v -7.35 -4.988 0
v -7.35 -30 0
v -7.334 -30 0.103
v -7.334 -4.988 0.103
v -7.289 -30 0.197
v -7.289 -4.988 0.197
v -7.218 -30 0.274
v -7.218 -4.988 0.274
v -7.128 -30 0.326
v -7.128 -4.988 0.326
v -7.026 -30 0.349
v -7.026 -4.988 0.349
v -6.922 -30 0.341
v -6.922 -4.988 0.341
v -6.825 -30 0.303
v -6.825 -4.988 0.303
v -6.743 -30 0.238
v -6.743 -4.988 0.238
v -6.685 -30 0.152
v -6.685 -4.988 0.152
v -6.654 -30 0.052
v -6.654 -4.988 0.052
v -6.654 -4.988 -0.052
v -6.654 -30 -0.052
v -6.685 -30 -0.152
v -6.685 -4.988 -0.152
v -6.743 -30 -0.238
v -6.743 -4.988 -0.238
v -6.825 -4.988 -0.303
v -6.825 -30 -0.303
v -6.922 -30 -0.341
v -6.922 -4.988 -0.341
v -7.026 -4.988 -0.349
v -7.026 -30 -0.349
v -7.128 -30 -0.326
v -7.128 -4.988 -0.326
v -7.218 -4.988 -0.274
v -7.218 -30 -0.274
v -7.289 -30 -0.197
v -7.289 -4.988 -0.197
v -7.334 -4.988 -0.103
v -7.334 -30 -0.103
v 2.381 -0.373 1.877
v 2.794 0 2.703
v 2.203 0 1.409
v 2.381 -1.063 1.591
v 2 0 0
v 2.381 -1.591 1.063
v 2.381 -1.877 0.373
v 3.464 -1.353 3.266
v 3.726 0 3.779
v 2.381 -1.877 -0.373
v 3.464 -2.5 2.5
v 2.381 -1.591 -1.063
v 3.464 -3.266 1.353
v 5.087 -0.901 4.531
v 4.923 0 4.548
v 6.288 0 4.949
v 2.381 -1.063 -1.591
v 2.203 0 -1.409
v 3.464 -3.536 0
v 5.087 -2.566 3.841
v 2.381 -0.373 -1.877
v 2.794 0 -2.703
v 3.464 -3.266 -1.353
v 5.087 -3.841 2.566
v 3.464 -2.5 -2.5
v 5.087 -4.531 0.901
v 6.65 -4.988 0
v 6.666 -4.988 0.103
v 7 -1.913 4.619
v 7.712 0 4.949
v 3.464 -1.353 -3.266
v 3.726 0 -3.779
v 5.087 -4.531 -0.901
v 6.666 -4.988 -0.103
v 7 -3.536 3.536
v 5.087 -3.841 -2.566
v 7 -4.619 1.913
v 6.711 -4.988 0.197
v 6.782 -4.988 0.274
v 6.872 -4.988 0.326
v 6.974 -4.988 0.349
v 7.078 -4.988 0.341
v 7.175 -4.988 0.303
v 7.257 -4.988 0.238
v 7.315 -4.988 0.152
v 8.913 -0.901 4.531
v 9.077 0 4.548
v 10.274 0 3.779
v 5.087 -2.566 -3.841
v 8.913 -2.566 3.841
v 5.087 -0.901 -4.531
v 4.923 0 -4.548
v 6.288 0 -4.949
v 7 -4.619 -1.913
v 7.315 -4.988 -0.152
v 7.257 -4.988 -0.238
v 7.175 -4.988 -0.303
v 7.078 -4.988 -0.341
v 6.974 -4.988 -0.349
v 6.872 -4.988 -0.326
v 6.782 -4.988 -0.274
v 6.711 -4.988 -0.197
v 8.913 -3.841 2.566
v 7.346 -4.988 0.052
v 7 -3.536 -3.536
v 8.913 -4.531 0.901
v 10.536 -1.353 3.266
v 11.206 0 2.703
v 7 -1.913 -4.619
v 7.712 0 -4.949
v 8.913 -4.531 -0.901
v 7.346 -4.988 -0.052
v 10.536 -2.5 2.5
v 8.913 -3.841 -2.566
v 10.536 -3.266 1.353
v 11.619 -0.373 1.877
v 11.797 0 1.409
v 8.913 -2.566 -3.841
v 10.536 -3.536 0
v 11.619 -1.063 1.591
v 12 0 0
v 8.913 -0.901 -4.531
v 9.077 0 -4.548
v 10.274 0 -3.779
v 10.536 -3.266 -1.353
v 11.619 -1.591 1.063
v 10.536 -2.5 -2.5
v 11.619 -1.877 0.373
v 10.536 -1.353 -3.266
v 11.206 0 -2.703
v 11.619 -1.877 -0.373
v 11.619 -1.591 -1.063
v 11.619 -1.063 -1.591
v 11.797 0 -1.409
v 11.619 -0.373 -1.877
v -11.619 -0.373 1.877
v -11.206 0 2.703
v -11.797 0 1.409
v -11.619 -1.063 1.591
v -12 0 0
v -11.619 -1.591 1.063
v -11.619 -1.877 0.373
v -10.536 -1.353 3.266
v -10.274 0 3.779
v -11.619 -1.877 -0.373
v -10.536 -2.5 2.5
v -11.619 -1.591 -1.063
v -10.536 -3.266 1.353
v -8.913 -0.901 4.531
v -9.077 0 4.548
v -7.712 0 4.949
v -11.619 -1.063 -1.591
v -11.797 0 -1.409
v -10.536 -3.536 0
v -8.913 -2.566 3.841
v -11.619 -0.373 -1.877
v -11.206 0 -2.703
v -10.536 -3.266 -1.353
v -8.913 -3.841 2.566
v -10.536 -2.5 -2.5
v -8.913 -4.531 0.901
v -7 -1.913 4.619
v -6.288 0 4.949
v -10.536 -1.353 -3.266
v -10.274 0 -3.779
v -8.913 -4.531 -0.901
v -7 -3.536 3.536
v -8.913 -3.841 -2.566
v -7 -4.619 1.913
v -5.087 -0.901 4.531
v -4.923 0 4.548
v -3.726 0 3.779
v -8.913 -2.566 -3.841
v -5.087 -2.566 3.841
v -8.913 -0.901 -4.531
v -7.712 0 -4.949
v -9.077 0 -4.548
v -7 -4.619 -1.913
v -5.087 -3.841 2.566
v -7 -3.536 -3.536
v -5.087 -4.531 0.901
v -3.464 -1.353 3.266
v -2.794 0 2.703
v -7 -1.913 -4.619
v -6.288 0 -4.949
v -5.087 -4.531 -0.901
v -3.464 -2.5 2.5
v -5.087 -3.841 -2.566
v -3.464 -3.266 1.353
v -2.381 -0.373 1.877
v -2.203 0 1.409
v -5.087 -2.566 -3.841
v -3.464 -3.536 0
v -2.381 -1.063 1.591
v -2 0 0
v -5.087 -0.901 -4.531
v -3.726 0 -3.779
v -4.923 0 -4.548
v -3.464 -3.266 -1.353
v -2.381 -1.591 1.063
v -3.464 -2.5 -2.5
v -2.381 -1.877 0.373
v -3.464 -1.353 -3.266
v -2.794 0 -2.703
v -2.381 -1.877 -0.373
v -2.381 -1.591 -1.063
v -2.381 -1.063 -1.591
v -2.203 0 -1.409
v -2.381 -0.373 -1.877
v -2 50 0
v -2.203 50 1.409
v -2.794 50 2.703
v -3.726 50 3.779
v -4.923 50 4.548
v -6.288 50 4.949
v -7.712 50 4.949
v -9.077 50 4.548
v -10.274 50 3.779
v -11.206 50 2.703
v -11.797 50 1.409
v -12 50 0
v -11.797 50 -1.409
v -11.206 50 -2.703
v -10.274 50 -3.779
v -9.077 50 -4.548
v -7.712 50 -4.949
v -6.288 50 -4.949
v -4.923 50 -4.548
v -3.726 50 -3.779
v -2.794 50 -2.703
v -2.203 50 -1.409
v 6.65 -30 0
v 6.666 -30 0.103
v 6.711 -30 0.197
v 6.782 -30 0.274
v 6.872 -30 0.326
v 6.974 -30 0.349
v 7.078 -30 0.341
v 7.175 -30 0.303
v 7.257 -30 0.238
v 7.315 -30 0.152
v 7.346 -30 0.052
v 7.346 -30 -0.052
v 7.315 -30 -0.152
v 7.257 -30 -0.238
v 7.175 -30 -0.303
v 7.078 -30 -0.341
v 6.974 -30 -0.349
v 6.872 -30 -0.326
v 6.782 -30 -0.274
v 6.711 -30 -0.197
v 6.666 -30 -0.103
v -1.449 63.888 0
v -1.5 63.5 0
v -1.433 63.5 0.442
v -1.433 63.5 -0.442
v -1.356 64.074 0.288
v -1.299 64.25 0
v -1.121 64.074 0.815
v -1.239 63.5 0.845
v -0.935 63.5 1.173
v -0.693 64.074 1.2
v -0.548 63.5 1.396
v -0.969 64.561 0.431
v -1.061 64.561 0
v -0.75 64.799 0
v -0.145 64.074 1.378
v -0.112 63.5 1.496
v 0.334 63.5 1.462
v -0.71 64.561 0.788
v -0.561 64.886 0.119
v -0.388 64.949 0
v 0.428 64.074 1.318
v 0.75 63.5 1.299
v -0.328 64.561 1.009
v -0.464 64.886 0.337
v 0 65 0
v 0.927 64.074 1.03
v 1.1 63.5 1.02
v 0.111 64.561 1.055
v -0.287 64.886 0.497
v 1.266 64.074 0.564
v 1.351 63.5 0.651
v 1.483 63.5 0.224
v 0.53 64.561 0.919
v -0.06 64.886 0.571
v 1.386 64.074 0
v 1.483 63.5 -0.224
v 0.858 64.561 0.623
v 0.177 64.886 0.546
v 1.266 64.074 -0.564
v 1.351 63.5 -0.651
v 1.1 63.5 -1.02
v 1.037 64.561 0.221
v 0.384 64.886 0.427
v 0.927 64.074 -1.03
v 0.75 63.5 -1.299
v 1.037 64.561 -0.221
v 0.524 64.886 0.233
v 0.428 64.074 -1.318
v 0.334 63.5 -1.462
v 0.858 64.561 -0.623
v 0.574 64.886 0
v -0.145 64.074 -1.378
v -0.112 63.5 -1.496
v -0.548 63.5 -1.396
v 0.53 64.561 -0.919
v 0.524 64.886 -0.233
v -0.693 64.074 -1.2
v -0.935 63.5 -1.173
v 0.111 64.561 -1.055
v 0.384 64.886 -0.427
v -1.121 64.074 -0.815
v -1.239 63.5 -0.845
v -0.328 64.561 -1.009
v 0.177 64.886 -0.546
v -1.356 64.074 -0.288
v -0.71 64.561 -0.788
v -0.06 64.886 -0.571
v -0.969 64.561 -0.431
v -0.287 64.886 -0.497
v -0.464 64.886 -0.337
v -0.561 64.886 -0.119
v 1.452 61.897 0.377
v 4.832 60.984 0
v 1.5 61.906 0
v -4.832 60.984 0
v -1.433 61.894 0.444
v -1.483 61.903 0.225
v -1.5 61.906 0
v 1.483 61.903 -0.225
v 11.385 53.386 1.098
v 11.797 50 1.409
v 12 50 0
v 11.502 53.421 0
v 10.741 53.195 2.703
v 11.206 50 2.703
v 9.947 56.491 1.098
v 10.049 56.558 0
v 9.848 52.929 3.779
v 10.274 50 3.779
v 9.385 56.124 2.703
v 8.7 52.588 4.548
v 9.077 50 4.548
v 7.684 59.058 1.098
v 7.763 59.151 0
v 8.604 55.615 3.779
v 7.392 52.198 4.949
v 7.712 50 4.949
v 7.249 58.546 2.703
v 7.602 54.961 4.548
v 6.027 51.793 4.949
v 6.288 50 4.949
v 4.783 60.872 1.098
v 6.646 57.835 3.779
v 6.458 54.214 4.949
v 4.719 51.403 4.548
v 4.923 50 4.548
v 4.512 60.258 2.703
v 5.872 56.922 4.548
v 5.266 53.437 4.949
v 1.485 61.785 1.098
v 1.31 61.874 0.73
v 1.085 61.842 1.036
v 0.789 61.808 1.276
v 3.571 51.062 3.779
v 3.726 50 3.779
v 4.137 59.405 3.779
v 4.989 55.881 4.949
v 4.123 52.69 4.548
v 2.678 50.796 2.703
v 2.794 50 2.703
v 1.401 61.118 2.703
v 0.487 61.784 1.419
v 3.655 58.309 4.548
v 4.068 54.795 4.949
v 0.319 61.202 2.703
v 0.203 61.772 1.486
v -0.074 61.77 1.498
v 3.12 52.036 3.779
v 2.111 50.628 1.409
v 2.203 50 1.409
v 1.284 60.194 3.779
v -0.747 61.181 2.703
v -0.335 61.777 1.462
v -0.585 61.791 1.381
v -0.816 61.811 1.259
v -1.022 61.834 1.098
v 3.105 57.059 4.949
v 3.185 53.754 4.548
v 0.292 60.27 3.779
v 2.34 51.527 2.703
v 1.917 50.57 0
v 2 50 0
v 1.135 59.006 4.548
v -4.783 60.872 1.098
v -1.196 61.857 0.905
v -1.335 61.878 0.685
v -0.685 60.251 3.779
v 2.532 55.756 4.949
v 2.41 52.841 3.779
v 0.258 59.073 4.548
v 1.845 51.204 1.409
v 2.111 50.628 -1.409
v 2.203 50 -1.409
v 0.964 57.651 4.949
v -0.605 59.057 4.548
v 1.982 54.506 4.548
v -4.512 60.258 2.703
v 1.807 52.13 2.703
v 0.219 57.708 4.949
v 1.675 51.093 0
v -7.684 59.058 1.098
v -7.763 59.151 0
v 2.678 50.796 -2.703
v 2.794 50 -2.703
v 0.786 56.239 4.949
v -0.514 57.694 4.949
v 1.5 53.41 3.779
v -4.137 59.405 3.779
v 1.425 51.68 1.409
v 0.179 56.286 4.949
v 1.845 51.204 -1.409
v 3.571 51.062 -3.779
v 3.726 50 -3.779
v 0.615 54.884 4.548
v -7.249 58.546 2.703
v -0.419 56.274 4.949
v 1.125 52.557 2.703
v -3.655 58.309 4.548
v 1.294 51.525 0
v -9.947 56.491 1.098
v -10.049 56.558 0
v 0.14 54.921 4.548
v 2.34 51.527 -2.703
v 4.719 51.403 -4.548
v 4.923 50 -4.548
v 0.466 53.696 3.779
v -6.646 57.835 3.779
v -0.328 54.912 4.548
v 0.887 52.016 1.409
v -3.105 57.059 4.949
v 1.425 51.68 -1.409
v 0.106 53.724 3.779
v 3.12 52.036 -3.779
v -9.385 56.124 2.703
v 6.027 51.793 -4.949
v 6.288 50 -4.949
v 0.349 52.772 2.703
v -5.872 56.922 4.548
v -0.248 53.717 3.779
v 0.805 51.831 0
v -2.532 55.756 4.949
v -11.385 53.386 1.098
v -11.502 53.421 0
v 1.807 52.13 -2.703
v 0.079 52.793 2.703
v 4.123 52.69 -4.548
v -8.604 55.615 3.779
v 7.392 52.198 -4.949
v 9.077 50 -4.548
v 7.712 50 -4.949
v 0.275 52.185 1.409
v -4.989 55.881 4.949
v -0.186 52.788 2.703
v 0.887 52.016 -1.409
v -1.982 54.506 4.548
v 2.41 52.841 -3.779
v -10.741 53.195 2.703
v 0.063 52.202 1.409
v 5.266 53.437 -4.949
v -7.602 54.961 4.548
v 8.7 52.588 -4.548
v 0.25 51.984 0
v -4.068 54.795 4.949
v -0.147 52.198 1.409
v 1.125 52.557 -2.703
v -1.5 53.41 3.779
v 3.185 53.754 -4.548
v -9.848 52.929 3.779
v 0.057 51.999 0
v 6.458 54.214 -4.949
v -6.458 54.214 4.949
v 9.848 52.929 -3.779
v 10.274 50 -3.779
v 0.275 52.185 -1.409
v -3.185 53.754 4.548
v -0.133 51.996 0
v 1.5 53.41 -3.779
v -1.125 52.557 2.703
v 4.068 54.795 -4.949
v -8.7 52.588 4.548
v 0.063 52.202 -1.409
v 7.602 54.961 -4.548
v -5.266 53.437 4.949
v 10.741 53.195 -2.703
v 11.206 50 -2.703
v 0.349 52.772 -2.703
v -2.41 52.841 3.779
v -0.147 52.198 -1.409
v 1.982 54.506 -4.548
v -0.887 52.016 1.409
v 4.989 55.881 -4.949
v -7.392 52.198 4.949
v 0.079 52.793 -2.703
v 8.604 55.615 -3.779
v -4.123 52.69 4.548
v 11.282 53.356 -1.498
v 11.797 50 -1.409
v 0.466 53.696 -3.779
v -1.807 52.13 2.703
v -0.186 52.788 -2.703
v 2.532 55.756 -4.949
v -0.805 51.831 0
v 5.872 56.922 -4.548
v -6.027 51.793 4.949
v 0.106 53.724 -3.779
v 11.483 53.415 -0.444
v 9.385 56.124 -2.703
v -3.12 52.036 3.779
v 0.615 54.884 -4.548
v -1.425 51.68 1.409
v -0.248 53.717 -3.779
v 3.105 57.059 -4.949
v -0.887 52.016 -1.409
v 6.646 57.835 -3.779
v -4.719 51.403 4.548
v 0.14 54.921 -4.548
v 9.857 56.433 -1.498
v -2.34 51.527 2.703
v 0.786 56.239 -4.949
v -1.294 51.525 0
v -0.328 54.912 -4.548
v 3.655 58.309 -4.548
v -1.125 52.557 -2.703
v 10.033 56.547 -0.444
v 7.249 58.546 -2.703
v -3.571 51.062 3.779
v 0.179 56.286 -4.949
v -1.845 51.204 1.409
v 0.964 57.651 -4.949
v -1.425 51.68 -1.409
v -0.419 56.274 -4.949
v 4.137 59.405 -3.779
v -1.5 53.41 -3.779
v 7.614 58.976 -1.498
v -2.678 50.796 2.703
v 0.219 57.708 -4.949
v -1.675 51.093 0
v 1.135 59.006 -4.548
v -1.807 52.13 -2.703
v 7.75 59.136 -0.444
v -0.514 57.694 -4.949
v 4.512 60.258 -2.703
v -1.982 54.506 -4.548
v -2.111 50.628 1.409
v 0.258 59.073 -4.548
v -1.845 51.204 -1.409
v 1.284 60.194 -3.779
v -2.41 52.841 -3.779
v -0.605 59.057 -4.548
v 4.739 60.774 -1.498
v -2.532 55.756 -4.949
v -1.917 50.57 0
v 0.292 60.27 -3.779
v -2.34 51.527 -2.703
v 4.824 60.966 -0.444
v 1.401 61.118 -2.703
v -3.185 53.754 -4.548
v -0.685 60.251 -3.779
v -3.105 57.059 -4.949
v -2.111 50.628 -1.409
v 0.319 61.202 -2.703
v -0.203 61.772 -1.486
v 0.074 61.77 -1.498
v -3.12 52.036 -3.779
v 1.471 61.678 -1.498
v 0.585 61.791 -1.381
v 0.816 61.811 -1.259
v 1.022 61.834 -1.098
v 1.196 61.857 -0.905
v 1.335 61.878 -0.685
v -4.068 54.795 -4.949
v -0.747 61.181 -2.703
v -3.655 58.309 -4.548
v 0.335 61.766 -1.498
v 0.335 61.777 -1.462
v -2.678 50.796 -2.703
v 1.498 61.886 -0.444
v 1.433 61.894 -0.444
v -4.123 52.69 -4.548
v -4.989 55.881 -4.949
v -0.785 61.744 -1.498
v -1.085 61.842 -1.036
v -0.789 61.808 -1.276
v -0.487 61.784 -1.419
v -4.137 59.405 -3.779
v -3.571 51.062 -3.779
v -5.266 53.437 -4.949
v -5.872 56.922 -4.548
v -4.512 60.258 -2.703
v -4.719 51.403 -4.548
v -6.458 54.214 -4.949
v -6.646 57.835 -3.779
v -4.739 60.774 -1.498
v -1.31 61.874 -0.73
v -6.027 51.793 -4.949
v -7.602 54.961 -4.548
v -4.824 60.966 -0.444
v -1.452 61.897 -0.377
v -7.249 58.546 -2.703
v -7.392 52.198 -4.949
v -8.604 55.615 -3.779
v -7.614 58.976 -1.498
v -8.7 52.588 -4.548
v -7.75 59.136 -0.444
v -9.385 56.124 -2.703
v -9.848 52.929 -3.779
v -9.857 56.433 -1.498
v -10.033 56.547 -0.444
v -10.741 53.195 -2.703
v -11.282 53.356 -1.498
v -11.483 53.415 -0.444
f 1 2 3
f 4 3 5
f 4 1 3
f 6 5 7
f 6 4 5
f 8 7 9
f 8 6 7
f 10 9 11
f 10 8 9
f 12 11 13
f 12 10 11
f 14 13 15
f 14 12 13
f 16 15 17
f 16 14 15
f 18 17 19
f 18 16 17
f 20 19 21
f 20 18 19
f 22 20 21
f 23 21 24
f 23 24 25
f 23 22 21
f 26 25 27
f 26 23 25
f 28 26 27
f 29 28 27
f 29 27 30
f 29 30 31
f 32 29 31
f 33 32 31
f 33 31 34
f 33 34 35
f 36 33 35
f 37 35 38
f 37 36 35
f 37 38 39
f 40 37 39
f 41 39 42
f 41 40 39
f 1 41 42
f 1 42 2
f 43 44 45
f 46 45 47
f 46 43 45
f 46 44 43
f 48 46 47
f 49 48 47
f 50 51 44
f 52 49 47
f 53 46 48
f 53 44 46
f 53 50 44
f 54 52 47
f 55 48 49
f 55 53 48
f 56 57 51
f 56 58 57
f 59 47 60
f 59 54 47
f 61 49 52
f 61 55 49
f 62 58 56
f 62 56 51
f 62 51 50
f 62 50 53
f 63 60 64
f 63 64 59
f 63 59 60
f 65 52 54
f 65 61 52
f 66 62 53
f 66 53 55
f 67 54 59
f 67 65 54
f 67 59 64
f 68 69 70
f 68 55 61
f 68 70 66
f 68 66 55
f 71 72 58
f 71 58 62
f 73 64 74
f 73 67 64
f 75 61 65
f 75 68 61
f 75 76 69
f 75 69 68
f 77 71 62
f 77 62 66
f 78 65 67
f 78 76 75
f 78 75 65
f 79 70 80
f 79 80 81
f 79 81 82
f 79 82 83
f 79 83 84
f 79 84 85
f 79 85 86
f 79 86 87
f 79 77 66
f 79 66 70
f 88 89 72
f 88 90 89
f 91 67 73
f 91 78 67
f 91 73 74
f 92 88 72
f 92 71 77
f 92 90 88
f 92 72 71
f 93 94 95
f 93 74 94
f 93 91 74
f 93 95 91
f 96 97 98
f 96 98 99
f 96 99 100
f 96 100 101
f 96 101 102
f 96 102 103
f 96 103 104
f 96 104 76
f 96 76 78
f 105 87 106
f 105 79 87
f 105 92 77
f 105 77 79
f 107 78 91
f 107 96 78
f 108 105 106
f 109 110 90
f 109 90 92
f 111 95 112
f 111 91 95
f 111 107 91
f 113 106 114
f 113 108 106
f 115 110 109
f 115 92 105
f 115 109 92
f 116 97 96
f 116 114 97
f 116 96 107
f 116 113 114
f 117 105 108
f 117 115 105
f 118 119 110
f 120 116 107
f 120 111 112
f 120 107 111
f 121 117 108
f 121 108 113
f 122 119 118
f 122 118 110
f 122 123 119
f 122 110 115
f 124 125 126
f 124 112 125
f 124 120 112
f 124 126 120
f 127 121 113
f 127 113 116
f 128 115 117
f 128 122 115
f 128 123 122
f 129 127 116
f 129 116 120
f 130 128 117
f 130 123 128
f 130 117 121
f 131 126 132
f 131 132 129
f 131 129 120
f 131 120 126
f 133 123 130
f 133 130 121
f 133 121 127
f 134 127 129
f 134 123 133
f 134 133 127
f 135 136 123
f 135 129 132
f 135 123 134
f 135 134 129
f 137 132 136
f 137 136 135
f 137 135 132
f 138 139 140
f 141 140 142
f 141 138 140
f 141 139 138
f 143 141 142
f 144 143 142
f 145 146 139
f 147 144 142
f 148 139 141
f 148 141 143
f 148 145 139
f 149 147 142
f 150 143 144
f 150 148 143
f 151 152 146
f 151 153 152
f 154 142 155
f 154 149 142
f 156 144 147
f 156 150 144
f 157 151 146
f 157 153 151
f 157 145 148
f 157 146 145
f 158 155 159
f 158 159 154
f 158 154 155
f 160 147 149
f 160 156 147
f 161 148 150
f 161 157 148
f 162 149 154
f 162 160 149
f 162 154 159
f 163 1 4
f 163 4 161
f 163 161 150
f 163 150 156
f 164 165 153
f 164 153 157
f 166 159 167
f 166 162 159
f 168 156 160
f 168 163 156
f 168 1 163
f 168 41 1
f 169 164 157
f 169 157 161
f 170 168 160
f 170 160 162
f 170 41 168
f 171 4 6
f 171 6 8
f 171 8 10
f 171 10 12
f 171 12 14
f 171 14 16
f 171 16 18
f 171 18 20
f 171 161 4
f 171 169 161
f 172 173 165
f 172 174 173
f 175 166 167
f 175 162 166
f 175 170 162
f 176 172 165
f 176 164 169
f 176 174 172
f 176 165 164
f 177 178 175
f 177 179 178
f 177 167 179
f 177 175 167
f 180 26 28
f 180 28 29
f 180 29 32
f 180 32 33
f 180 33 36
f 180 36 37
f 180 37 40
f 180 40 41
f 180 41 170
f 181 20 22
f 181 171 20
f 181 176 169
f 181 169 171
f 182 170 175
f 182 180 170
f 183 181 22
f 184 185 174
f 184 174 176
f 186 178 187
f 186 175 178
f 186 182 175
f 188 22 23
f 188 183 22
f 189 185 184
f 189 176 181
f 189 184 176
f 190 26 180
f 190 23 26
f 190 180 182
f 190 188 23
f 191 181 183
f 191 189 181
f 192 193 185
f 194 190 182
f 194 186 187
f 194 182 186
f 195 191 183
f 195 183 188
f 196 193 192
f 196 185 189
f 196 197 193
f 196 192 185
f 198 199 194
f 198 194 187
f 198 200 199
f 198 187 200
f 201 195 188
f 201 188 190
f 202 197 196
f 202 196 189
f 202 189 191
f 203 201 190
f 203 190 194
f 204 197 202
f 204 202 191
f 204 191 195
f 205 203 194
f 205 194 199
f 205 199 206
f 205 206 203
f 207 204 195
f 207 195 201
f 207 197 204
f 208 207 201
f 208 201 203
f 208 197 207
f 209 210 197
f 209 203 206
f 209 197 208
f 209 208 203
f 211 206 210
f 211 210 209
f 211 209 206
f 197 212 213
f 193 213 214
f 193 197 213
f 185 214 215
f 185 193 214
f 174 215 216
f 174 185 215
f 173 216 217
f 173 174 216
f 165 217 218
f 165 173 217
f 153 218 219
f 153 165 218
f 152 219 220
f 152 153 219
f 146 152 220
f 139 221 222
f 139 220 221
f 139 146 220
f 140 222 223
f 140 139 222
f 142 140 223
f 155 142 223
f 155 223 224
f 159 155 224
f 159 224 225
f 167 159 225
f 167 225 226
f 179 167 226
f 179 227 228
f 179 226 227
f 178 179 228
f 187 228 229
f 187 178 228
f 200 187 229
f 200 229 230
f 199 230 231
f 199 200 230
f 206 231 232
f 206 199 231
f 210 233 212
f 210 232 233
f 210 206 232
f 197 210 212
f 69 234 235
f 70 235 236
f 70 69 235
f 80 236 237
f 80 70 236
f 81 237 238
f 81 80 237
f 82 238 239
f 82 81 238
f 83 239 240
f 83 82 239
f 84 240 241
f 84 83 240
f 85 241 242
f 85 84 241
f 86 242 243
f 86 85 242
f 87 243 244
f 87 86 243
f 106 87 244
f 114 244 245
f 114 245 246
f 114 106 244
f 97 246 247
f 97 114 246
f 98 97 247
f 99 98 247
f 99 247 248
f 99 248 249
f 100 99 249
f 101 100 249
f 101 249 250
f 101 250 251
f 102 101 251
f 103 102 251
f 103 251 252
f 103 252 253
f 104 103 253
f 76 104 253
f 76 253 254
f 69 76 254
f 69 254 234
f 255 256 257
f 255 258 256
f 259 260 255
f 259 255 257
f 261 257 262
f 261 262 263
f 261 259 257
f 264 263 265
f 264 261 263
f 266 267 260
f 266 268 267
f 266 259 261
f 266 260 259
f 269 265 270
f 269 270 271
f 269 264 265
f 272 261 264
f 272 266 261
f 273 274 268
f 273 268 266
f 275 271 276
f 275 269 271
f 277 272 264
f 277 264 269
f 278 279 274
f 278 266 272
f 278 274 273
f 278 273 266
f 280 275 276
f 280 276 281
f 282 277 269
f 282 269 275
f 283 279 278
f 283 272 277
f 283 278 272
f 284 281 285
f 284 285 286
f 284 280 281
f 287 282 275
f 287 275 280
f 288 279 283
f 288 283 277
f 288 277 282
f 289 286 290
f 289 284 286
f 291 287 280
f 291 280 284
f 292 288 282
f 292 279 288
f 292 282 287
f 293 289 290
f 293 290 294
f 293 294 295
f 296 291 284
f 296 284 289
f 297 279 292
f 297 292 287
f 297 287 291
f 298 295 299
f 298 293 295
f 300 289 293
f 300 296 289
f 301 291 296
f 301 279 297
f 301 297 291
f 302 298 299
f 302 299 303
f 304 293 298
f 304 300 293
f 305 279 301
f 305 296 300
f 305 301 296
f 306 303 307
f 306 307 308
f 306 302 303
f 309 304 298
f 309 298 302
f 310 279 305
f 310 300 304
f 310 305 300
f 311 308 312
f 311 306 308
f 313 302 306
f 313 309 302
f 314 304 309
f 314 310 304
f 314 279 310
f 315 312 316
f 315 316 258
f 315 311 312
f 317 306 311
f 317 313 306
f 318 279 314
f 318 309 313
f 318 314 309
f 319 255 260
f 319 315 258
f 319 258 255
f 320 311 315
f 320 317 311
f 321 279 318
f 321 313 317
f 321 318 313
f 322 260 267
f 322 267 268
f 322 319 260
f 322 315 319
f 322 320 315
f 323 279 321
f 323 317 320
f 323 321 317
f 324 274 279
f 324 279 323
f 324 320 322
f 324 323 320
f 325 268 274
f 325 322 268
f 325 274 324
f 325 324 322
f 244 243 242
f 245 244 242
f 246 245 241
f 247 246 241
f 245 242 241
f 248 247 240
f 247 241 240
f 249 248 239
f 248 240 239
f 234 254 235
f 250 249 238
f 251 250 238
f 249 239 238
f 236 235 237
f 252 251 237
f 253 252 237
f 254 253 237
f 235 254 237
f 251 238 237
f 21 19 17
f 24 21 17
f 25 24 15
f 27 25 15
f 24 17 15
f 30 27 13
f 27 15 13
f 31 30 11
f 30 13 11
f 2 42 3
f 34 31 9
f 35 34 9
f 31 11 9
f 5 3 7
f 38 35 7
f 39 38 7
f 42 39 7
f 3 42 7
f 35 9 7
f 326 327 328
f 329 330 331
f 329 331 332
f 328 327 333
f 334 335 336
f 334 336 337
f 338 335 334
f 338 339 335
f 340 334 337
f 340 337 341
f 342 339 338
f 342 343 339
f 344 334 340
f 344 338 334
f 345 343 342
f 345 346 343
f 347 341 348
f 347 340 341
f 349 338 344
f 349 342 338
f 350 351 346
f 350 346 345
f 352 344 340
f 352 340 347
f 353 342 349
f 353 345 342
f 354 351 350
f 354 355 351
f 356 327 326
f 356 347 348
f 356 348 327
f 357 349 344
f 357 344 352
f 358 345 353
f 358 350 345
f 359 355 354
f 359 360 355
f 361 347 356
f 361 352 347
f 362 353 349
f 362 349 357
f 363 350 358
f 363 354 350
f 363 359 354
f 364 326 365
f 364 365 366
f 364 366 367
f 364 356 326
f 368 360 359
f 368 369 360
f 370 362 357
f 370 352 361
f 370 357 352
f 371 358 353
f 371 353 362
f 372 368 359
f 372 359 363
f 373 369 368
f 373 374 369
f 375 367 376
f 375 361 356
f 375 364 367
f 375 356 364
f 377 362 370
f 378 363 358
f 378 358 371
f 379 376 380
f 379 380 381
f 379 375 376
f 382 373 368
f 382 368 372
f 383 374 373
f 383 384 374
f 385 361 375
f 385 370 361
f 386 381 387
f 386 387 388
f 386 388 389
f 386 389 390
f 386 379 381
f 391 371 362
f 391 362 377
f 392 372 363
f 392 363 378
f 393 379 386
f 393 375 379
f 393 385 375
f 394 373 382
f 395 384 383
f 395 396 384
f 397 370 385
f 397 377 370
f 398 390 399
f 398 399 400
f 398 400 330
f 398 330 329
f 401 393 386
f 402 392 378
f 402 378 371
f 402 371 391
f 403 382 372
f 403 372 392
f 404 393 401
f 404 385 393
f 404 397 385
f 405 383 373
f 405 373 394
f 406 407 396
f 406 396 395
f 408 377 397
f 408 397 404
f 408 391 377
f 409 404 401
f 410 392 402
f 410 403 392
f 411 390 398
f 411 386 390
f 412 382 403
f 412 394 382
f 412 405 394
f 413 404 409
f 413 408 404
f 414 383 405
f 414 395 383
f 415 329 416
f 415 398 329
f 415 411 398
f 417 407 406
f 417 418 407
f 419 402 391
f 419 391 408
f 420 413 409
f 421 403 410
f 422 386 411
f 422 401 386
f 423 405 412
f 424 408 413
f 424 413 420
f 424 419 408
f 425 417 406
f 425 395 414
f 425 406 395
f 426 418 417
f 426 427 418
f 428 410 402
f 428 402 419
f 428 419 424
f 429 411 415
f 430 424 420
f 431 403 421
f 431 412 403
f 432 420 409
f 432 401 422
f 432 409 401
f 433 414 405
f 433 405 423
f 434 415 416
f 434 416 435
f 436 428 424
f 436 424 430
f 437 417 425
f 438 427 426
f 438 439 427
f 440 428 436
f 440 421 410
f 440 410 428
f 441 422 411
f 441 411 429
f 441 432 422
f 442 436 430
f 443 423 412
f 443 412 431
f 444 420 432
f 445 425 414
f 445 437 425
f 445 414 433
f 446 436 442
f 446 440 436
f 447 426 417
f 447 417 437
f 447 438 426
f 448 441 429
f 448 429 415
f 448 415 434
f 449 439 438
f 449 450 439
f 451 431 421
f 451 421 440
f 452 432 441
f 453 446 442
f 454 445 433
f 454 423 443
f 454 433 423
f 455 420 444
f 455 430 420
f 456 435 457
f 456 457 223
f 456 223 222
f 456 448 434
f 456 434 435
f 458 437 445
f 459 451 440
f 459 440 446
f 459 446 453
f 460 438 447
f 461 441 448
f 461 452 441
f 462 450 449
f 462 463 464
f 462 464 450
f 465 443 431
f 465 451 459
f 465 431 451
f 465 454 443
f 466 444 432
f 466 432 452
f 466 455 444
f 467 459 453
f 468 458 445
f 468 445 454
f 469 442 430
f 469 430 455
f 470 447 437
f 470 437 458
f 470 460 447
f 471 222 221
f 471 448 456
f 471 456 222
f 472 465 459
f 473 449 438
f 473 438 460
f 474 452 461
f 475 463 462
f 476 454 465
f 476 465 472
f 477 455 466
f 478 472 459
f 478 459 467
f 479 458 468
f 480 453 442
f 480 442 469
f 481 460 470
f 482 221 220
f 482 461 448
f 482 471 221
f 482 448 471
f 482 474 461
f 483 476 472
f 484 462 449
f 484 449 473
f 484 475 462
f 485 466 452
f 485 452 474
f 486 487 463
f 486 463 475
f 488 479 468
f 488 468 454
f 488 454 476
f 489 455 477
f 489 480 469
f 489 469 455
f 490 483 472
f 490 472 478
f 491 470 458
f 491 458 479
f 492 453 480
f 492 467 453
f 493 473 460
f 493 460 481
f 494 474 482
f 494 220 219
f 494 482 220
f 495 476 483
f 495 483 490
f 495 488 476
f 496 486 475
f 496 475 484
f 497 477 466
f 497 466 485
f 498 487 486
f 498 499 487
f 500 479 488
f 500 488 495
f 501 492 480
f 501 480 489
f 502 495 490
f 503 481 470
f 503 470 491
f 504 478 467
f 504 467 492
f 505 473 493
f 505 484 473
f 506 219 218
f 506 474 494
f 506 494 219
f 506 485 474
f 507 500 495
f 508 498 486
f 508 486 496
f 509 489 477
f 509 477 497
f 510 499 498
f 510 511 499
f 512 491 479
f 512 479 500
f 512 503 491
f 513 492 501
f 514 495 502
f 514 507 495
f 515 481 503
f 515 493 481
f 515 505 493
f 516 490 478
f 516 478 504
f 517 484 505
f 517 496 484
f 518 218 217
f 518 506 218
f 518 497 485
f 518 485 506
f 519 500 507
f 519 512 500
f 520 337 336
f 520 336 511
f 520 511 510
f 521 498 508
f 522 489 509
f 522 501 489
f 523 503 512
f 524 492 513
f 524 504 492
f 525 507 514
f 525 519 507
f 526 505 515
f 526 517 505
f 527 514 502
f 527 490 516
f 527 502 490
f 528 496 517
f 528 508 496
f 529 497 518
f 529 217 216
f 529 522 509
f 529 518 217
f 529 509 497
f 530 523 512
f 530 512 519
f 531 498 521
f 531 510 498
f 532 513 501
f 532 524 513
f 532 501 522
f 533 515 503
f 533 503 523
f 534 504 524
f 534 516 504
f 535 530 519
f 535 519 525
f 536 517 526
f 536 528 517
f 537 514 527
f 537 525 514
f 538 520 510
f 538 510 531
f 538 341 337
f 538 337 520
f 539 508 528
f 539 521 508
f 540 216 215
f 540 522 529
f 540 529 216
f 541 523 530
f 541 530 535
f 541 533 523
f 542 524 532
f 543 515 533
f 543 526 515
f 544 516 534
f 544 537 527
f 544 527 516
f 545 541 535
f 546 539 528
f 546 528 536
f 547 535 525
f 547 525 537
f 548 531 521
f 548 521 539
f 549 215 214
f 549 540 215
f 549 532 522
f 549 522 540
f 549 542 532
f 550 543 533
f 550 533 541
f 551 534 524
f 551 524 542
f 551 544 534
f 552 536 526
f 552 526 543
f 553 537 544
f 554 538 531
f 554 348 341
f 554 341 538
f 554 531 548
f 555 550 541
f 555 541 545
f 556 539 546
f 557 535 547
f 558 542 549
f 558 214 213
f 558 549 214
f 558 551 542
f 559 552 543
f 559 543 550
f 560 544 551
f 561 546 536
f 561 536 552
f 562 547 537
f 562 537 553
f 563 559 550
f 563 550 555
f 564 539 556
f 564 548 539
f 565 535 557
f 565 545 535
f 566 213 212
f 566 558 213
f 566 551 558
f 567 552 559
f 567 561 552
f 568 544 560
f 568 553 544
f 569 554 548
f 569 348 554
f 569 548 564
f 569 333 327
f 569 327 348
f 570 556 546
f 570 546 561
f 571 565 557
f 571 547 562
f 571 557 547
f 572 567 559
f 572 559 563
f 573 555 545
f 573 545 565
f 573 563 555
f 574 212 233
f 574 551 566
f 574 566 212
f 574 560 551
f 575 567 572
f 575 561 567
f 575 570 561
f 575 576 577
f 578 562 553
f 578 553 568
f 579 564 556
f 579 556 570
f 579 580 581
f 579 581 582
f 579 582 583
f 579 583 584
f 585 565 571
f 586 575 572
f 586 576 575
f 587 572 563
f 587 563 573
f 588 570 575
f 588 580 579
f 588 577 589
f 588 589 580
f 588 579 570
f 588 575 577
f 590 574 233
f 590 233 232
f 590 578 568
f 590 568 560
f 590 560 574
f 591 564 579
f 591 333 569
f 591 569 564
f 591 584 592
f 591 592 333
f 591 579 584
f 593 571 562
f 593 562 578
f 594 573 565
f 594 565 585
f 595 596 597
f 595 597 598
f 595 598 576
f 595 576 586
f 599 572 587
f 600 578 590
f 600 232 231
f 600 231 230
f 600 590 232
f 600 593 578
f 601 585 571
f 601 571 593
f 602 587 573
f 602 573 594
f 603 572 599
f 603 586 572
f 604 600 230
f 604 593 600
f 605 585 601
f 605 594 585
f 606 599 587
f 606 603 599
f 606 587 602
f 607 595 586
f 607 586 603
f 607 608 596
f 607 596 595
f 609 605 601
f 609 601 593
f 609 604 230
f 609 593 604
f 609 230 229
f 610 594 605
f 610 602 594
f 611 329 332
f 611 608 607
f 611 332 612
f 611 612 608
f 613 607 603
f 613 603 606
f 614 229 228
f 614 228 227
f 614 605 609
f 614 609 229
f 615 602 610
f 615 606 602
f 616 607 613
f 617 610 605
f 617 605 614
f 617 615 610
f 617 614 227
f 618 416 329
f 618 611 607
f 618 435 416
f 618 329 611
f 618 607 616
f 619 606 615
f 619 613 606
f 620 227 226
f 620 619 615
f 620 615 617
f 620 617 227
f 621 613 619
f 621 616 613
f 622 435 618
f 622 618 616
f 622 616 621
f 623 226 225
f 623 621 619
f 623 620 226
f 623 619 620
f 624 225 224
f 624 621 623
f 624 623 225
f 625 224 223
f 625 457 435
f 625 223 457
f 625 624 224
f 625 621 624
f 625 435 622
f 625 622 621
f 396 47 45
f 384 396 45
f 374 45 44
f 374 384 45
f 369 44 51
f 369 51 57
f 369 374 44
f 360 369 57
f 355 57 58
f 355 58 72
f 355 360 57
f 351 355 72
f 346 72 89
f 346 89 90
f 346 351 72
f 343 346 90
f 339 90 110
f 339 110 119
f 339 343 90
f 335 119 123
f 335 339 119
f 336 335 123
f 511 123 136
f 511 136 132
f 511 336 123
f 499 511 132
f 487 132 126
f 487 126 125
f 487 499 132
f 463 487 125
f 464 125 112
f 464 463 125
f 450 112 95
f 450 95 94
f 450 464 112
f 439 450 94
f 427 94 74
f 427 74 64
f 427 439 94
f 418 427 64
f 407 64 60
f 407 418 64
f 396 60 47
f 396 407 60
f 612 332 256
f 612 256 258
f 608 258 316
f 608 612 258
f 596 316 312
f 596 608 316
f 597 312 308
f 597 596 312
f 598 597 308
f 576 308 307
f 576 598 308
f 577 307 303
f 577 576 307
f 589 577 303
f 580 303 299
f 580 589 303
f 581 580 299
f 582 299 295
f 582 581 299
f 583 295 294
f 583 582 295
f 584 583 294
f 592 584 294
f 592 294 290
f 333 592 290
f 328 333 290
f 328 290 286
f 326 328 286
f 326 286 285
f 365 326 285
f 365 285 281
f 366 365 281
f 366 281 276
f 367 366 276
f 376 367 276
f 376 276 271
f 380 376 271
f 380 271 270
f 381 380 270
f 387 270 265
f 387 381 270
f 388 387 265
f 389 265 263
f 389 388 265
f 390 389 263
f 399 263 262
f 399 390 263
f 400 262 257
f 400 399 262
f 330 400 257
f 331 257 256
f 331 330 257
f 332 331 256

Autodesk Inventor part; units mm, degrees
ref_plane "YZ Plane" through (0, 0, 0) normal (1, 0, 0) x (0, 1, 0)
ref_plane "XY Plane" through (0, 0, 0) normal (0, 0, 1) x (1, 0, 0)
sketch "Sketch1" plane through (0, 0, 0) normal (0, 1, 0) x (-1, 0, 0)
  circle A0 centre (7, 0) radius 5
  circle A1 centre (-7, 0) radius 5
  line L0 (7, 0) -> (-7, 0) construction
  line L1 (12, 0) -> (2, 0)
  line L2 (-2, 0) -> (-12, 0)
  circle A2 centre (-7, 0) radius 0.35
  circle A3 centre (7, 0) radius 0.35
  point P0 (0, 0)
  point P1 (0, 0)
  dimension "d0" = 10
  dimension "d1" = 14
  dimension "d8" = 0.7
sketch "Sketch2" plane through (0, 0, 0) normal (0, 0, 1) x (1, 0, 0)
  line L0 (7, 0) -> (7, 50)
  line L1 (-7, 0) -> (-7, 50)
  line L2 (-7, 0) -> (7, 0) construction
  arc A0 (7, 50) -> (-7, 50) centre (0, 50) ccw
  point P0 (0, 0)
  point P1 (0, 0)
  dimension "d2" = 14
  dimension "d3" = 50
sweep "Sweep1" add profiles "Sketch1" path "Sketch2" contours L2 A2 A1 | A1 L2 A2 | A2 L2 | L2 A2
revolve "Revolution1" add sketch "Sketch1" angle 360 about axis through (-7, 0, 0) along (1, 0, 0) picked at (3.6018, 0.4268) picked at (7.0663, 0.096) contours L1 A3 A0 | L1 A3
revolve "Revolution2" add sketch "Sketch1" angle 360 about axis through (2, 0, 0) along (1, 0, 0) picked at (-10.3982, 0.4268) picked at (-6.9337, 0.096) contours L2 A2 A1 | L2 A2
extrude "Extrusion1" add sketch "Sketch1" against normal blind 30 contours A3 L1 | L1 A3 | A2 L2 | L2 A2
ref_plane "Work Plane1" through (0, 61, 0) normal (0, 1, 0) x (-1, 0, 0)
sketch "Sketch3" plane through (0, 61, 0) normal (0, 1, 0) x (-1, 0, 0)
  circle A0 centre (0, 0) radius 1.5
  dimension "d12" = 3
extrude "Extrusion2" add sketch "Sketch3" along normal blind 4
fillet "Fillet1" radius 1.5 1 edges at (1.5, 65, 0)
properties part number "Flashbulb-DU8902" material "Phenolic Resin"
